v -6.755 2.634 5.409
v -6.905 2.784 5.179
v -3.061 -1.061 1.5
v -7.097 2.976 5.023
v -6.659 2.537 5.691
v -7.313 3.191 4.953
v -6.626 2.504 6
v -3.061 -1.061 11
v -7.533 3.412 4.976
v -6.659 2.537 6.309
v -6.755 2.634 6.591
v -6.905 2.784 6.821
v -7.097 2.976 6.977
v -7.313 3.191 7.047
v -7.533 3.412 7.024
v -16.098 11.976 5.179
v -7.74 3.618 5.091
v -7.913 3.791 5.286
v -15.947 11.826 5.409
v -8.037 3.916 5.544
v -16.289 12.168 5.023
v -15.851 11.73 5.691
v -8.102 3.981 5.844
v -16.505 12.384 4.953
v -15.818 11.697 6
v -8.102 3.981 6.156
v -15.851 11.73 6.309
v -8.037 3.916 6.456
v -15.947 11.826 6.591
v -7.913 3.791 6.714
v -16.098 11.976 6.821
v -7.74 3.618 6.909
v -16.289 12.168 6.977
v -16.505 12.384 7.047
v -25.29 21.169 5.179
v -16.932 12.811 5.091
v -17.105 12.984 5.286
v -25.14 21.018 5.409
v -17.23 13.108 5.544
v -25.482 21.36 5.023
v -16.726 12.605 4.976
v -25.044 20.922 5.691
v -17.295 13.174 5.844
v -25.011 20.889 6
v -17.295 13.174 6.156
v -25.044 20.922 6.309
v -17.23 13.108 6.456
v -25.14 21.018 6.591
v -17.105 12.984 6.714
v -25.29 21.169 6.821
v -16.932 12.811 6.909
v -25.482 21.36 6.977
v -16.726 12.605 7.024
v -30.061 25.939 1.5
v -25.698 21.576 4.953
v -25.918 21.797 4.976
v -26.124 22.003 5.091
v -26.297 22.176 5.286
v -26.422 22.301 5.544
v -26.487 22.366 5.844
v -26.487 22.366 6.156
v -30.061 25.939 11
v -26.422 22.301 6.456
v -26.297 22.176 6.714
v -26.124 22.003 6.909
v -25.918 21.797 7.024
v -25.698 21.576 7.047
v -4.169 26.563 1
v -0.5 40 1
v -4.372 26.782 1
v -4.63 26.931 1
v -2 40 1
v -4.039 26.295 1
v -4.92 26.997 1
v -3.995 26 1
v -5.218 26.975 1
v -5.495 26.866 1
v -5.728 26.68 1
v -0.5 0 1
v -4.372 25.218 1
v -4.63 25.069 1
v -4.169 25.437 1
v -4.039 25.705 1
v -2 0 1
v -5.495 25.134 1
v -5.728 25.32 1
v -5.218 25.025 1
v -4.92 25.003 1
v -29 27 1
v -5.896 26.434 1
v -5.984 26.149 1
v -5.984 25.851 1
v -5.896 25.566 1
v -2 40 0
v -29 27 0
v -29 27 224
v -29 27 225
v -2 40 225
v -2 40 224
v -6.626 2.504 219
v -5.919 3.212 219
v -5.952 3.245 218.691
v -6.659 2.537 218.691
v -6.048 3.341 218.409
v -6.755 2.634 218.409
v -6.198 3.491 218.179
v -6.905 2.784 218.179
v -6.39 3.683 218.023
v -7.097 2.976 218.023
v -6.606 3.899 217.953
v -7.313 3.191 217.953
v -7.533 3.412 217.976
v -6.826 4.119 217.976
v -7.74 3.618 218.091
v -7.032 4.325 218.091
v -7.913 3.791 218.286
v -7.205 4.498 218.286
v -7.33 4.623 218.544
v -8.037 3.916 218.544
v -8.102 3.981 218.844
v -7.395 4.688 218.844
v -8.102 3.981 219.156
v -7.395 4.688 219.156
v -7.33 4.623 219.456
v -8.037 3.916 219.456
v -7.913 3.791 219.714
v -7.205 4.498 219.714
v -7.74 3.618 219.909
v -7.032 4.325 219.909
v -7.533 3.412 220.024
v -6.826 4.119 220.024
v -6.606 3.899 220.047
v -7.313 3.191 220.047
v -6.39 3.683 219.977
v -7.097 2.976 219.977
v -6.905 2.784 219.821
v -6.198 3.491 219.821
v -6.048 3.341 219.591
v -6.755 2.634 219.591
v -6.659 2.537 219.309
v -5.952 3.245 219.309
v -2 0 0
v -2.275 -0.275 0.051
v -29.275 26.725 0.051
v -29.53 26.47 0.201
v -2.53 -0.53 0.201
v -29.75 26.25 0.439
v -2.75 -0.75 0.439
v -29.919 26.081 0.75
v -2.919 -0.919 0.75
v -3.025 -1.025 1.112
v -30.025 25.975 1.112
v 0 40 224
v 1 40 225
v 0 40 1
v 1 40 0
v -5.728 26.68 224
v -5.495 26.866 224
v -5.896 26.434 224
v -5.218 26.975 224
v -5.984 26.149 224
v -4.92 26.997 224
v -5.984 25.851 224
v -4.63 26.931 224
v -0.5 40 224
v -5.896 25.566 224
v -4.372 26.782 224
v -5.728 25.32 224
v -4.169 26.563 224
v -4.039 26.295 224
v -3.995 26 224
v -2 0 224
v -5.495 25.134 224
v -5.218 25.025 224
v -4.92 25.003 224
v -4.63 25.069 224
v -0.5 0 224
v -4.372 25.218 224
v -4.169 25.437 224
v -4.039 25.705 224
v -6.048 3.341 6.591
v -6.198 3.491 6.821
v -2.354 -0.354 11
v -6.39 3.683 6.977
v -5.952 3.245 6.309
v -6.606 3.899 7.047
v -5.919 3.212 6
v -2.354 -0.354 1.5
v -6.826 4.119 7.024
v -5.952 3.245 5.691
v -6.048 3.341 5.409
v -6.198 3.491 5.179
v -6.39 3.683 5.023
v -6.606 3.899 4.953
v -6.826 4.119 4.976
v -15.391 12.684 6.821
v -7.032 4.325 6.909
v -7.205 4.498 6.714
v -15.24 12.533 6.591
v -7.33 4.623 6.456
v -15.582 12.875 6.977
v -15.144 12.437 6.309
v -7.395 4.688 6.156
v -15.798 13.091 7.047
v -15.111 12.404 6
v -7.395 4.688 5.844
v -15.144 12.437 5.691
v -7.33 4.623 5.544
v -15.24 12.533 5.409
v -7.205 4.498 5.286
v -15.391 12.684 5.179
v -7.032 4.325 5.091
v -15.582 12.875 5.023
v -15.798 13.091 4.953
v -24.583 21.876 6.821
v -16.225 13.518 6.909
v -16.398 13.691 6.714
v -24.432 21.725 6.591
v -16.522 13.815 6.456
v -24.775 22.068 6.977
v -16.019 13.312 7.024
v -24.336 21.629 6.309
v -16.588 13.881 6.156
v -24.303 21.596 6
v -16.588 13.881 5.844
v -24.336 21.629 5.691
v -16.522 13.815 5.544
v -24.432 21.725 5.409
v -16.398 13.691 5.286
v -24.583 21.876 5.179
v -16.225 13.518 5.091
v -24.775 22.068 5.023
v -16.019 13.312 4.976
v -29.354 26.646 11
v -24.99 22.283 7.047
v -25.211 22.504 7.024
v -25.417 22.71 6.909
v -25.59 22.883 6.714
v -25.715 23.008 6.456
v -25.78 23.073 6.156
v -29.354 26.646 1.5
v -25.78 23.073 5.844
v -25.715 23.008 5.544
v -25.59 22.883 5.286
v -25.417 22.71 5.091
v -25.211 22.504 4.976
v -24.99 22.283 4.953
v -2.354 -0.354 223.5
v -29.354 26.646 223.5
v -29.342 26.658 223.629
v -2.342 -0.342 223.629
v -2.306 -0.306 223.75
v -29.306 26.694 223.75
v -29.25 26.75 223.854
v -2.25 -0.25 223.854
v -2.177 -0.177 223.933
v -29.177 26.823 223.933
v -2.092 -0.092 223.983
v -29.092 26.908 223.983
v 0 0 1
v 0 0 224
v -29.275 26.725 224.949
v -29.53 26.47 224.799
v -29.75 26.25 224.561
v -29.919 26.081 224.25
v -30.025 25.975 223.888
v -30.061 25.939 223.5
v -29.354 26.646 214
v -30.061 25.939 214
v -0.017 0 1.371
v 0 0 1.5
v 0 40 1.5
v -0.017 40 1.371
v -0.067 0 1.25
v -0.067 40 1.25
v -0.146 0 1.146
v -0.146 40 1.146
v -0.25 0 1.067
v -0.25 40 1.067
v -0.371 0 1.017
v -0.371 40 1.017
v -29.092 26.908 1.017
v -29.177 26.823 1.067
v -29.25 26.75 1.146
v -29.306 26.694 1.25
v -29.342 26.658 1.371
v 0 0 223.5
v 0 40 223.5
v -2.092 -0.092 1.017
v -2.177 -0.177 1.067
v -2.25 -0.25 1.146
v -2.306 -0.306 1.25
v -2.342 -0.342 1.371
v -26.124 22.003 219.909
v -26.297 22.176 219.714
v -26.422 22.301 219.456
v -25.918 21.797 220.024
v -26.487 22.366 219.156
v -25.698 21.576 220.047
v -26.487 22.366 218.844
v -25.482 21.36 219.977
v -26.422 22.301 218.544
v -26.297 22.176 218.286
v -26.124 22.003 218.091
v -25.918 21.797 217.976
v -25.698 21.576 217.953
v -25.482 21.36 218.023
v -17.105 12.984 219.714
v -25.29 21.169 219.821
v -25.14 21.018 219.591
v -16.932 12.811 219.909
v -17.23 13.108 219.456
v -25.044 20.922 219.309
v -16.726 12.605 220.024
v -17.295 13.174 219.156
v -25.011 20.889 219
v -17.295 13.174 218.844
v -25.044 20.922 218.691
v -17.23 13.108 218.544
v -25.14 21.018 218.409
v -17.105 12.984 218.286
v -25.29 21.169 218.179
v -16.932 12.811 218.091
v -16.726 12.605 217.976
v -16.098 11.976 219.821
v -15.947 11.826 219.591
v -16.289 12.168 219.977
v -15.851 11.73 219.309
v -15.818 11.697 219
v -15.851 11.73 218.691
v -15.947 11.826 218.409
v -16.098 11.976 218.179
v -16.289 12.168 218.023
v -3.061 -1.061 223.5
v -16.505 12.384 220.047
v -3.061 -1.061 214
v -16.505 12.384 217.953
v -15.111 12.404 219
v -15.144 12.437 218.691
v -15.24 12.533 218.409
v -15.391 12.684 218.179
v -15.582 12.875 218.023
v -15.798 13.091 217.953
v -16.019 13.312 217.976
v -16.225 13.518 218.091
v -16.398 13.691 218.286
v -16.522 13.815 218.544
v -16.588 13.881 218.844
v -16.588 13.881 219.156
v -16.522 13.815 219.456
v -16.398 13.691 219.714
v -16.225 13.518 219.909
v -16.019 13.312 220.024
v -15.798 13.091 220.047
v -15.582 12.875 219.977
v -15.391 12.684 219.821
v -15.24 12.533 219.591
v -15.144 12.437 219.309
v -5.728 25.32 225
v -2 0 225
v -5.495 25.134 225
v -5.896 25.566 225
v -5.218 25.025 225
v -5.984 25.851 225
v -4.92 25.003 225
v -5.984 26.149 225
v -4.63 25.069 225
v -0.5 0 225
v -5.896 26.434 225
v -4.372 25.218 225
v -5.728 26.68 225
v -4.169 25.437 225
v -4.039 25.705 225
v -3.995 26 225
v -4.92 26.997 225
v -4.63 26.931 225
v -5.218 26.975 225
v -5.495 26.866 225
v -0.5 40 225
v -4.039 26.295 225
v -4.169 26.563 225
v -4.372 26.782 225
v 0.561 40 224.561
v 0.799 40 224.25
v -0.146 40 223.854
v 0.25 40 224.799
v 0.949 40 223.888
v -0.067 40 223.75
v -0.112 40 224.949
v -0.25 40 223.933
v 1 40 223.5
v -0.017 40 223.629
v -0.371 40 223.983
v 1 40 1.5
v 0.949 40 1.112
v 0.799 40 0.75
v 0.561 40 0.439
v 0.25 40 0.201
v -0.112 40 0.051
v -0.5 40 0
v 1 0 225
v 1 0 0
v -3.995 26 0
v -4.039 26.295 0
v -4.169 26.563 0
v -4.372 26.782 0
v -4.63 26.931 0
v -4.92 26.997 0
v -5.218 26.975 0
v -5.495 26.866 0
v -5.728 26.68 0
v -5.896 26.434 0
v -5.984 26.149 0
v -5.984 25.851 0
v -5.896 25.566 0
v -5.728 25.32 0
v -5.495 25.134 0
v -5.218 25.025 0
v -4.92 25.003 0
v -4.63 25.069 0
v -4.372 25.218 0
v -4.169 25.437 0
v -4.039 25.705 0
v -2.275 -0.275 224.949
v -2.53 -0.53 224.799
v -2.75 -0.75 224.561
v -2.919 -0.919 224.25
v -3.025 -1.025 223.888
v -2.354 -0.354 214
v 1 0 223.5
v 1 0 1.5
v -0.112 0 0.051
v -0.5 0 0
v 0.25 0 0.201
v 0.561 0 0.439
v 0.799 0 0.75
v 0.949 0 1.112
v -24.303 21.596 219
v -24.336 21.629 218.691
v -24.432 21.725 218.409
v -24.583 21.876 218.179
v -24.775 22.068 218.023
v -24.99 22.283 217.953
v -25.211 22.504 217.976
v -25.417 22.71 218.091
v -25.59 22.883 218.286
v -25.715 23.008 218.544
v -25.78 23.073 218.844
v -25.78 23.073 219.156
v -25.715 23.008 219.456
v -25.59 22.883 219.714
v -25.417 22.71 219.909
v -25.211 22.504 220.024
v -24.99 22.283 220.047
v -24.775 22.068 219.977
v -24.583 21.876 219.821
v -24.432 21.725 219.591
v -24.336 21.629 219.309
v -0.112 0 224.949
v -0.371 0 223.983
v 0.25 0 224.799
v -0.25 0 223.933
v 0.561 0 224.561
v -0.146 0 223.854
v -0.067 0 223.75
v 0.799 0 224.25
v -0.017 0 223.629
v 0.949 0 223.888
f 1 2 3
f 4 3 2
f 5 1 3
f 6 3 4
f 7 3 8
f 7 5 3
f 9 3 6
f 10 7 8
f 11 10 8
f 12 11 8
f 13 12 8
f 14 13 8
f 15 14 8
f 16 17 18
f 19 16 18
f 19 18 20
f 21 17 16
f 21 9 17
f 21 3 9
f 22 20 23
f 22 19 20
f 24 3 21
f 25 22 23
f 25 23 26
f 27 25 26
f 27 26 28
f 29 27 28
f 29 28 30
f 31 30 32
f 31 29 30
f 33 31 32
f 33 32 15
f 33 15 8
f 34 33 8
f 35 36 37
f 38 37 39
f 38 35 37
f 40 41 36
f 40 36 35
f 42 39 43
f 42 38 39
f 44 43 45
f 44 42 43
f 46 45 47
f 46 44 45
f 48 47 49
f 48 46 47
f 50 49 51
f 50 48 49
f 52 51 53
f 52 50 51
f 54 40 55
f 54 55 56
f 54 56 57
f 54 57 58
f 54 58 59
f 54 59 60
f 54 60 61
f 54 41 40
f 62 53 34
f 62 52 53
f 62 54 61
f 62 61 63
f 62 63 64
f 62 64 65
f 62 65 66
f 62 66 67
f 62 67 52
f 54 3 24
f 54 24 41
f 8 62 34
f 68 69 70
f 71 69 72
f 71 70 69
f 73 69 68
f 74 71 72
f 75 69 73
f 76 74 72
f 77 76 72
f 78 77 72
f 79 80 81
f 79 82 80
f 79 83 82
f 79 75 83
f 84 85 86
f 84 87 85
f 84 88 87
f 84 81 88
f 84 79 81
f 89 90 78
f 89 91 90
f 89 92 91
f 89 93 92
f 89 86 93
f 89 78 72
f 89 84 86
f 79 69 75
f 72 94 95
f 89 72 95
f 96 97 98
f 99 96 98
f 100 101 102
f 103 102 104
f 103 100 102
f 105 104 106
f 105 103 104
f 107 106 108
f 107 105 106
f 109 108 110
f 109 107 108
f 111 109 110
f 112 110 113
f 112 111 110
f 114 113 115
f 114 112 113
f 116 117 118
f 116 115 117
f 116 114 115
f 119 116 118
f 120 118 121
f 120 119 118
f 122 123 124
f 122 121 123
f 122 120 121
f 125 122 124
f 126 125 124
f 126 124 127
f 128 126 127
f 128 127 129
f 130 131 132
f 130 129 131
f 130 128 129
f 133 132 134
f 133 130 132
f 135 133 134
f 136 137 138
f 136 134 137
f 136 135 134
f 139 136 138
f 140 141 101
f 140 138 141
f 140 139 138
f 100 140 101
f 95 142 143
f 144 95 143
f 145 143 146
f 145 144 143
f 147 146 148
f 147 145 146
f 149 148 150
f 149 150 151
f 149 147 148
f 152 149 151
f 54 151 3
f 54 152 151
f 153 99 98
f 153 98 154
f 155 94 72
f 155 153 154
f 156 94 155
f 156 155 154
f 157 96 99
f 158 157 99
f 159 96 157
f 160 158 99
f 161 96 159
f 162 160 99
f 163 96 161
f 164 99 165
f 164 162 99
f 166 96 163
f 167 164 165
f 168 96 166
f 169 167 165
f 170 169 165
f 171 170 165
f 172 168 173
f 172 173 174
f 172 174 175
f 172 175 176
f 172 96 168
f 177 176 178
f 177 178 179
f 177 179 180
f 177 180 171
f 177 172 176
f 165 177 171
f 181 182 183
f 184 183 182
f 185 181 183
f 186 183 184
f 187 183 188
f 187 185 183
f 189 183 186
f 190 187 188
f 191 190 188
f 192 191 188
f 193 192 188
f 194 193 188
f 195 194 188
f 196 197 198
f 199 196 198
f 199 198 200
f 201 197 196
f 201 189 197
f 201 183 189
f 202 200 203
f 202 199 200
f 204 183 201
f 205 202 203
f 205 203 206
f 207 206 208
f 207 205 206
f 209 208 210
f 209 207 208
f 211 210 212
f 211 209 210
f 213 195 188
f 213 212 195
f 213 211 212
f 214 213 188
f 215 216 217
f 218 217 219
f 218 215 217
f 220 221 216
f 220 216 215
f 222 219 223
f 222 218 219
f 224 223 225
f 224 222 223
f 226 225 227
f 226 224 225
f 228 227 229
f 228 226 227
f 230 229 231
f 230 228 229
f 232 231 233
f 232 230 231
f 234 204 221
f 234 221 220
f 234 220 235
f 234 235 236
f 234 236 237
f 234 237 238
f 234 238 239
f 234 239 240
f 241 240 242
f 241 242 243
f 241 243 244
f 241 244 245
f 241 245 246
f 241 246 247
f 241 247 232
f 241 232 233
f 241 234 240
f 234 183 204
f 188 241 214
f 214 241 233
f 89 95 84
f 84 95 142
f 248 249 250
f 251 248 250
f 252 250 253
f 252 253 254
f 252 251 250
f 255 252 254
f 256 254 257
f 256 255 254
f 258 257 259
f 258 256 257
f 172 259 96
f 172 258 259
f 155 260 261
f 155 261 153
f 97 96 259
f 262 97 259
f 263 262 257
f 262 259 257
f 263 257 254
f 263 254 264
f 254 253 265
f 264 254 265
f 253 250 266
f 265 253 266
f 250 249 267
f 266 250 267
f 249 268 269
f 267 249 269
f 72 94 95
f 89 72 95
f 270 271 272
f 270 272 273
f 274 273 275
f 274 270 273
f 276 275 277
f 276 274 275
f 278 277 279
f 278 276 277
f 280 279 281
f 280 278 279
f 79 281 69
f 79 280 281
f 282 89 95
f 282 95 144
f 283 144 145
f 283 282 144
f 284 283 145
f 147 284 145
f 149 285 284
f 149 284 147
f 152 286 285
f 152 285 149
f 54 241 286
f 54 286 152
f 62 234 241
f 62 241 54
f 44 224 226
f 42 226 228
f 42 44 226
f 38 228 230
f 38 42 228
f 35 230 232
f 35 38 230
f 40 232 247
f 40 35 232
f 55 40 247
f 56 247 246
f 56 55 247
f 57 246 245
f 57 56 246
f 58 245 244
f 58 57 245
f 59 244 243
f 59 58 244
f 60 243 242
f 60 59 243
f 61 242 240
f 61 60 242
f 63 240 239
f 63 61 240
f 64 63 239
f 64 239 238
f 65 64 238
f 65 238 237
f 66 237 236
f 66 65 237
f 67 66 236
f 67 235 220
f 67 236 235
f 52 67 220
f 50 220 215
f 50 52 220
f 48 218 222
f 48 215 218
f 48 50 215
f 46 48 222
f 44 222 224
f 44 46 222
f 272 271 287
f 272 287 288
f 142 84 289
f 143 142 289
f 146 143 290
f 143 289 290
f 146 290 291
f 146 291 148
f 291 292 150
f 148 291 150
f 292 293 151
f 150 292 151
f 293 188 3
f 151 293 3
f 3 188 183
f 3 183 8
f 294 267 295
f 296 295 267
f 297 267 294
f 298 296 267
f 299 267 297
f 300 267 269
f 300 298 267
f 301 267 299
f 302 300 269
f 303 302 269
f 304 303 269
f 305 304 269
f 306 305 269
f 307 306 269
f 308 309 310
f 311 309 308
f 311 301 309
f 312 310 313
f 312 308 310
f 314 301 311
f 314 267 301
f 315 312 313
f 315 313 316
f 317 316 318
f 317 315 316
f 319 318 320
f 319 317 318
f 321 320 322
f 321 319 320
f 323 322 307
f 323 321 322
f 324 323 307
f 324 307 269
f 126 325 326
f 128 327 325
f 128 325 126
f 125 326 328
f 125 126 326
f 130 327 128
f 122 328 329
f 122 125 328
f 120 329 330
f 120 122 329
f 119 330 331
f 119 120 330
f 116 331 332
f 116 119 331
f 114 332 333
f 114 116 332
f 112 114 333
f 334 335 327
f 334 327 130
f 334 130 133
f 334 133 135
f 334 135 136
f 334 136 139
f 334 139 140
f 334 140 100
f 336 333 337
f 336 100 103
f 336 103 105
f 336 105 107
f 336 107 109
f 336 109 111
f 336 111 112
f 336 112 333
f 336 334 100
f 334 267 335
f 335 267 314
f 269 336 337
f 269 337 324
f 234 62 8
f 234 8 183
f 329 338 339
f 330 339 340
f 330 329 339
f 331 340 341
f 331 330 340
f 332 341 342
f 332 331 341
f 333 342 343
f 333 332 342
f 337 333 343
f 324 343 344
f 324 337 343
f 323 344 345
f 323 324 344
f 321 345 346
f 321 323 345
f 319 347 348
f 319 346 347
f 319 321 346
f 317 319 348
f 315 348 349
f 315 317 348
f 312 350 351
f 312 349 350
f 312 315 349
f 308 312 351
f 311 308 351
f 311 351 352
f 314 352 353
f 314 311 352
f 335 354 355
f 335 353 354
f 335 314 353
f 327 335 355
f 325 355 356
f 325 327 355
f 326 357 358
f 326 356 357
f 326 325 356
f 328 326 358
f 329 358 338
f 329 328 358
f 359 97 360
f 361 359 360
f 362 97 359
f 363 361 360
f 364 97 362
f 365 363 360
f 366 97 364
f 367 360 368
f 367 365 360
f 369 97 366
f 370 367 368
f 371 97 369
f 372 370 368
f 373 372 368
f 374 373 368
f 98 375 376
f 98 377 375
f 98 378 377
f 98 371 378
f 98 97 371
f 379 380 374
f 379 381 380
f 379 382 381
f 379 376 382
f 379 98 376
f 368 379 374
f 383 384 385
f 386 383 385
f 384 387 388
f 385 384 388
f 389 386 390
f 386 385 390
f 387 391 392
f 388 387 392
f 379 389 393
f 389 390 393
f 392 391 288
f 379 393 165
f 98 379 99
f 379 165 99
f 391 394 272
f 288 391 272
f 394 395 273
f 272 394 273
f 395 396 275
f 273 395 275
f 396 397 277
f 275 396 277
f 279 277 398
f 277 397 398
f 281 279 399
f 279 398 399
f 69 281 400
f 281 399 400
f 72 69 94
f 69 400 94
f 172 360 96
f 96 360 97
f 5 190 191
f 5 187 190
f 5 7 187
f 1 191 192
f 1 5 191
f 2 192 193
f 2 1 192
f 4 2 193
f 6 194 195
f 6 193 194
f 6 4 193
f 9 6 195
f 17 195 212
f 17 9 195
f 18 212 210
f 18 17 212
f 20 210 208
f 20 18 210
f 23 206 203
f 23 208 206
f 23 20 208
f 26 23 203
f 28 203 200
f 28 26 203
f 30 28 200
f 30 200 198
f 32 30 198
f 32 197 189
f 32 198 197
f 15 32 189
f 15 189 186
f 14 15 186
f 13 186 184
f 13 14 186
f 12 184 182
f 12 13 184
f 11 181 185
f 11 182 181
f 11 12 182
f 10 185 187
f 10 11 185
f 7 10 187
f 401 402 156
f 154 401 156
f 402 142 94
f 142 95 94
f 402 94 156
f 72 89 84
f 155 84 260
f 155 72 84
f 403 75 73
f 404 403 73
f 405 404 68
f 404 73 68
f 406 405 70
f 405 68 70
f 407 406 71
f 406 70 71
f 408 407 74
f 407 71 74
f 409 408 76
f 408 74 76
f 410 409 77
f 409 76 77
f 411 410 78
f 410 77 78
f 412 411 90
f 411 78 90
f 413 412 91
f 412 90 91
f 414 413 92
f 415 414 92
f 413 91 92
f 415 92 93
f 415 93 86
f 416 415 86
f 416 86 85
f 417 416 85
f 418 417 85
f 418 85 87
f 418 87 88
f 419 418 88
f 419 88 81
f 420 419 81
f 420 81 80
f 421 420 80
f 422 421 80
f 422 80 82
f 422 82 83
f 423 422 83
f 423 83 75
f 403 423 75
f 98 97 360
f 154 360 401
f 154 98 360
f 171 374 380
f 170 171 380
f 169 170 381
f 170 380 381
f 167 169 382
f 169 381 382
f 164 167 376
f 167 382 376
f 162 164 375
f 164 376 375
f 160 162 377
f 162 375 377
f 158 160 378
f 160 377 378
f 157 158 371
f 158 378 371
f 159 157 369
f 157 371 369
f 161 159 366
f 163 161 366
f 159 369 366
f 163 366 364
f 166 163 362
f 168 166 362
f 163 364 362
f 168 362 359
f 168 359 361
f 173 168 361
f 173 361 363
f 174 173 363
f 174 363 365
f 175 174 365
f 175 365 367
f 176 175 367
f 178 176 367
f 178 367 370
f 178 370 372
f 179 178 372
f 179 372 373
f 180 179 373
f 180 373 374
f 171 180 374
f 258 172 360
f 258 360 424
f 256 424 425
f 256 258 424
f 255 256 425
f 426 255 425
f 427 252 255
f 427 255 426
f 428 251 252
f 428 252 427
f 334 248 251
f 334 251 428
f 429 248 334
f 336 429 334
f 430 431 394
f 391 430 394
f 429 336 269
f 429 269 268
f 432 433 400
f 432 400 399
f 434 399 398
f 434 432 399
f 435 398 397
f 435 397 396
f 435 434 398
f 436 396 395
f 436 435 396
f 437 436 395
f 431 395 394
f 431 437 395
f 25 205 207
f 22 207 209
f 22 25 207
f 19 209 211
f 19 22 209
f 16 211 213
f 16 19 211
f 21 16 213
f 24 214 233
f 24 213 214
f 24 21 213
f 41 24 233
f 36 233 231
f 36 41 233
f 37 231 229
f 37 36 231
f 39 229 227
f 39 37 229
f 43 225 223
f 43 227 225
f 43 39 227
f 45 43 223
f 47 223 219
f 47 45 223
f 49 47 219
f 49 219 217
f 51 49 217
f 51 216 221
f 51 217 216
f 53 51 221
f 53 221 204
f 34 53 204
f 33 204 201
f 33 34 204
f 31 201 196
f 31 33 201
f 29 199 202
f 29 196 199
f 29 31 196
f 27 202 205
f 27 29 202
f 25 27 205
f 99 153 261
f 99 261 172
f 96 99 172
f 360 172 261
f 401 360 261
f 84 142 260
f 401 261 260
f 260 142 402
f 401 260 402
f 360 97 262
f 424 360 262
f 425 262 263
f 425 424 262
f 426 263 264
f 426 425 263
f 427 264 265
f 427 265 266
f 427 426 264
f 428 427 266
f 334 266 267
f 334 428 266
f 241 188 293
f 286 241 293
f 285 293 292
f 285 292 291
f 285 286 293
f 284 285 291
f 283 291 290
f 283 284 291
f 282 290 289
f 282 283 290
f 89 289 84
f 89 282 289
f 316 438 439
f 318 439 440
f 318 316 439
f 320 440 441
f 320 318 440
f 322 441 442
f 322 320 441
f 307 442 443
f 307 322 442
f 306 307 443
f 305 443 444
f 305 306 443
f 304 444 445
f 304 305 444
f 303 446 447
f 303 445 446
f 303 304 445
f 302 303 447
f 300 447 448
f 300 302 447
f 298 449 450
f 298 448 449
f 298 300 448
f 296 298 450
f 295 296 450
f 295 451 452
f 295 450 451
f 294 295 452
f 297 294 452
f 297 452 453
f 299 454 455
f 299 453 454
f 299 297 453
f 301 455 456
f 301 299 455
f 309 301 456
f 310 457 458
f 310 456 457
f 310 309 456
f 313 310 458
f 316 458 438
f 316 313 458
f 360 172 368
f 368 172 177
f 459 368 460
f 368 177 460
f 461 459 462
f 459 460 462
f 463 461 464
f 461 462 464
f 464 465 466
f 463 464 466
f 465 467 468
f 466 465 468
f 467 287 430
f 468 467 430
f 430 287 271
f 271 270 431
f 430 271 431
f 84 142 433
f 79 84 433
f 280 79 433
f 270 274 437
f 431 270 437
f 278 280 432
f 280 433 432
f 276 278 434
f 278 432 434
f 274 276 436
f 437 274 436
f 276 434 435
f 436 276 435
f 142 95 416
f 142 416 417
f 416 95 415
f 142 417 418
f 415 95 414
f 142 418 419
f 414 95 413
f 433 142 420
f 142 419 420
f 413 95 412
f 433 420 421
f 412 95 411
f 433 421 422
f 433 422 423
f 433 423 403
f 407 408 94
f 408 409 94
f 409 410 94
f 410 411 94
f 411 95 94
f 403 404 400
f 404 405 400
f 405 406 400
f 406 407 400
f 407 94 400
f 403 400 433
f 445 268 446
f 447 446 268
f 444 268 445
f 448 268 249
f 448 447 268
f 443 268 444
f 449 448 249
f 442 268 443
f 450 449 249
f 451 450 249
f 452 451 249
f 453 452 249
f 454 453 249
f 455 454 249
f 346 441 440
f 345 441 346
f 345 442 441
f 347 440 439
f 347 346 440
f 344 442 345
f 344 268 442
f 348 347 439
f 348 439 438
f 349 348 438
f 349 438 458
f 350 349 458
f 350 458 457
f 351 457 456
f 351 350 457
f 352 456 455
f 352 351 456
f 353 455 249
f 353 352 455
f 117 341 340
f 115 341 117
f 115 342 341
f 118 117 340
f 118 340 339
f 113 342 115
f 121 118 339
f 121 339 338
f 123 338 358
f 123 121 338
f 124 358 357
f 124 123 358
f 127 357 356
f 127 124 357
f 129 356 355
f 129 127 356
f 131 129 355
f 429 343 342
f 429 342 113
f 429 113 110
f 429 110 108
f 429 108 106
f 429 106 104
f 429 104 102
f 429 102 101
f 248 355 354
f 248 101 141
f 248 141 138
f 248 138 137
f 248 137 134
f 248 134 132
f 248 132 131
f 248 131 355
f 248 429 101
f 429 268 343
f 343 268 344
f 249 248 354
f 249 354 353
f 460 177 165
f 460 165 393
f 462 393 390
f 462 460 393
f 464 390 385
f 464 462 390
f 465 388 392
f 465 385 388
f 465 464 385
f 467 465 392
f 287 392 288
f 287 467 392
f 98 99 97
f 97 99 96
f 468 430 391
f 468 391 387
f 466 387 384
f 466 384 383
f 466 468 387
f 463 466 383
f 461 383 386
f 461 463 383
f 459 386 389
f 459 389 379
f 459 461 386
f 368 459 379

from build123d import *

# Parameters (mm, degrees)
SKETCH_1_W                       = 1
SKETCH_1_H                       = 40
EXTRUDE_1_DEPTH                  = 225
EXTRUDE_2_DEPTH                  = 1
EXTRUDE_3_DEPTH                  = 1
SHEET_METAL_1_OUTLINE_W          = 1
SHEET_METAL_1_OUTLINE_H          = 40
SHEET_METAL_1_DEPTH              = 225
SHEET_METAL_1_2_DEPTH            = 1.5
SHEET_START                      = 223.5
SHEET_METAL_1_3_DEPTH            = 1.5
SHEET_START_2                    = -1
SHEET_METAL_1_4_DEPTH            = 42
SM_EDGE_FLANGE_1_DEPTH           = 38.183766184
SM_EDGE_FLANGE_2_DEPTH           = 38.183766184
SKETCH_15_R                      = 1
CUT_EXTRUDE_1_DEPTH              = 231.496514702
HOLE_WIZARD_2_1_2_1_1_AT_2_COUNT = 2
HOLE_WIZARD_2_1_2_1_1_AT_2_PITCH = 13
HOLE_WIZARD_2_1_2_1_1_AT_3_COUNT = 2
HOLE_WIZARD_2_1_2_1_1_AT_3_PITCH = 26
HOLE_WIZARD_2_1_2_1_1_AT_4_COUNT = 2
HOLE_WIZARD_2_1_2_1_1_AT_4_PITCH = 213
HOLE_WIZARD_2_1_2_1_1_AT_5_COUNT = 2
HOLE_WIZARD_2_1_2_1_1_AT_5_PITCH = 213.396344861
HOLE_WIZARD_2_1_2_1_1_AT_6_COUNT = 2
HOLE_WIZARD_2_1_2_1_1_AT_6_PITCH = 214.580987042


with BuildPart() as part:
    # Sketch 1 → Бобышка-Вытянуть1 (new body)
    with BuildSketch(Plane.XY):
        with Locations((0.5, 20)):
            Rectangle(SKETCH_1_W, SKETCH_1_H)
    extrude(amount=EXTRUDE_1_DEPTH)

    # Эскиз2 → Бобышка-Вытянуть2 (add)
    with BuildSketch(Plane.XY.offset(225)):
        Polygon((1, 0), (-2, 0), (-29, 27), (-2, 40), (1, 40), align=None)
    extrude(amount=-EXTRUDE_2_DEPTH)

    # Эскиз4 → Бобышка-Вытянуть3 (add)
    with BuildSketch(Plane(origin=(0, 0, 0), x_dir=(-1, 0, 0), z_dir=(0, 0, -1))):
        Polygon((-1, 40), (2, 40), (29, 27), (2, 0), (-1, 0), align=None)
    extrude(amount=-EXTRUDE_3_DEPTH)


with BuildPart() as body_2:
    # Sheet Metal 1: read off the stored shape, not the designer's step
    # Sheet Metal 1 outline → Sheet Metal 1 (new body)
    with BuildSketch(Plane.XY):
        with Locations((0.5, 20)):
            Rectangle(SHEET_METAL_1_OUTLINE_W, SHEET_METAL_1_OUTLINE_H)
    extrude(amount=SHEET_METAL_1_DEPTH)

    # Sheet Metal 1 2 outline → Sheet Metal 1 2 (add)
    with BuildSketch(Plane.XY):
        Polygon((0, 0), (0, 40), (-2, 40), (-29, 27), (-2, 0), align=None)
    extrude(amount=SHEET_METAL_1_2_DEPTH)

    # Sheet Metal 1 3 outline → Sheet Metal 1 3 (add)
    with BuildSketch(Plane.XY.offset(SHEET_START)):
        Polygon((0, 0), (0, 40), (-2, 40), (-29, 27), (-2, 0), align=None)
    extrude(amount=SHEET_METAL_1_3_DEPTH)

    # Sheet Metal 1 4 outline → Sheet Metal 1 4 (cut)
    with BuildSketch(Plane(origin=(0, 0, 0), x_dir=(1, 0, 0), z_dir=(0, 1, 0)).offset(SHEET_START_2)):
        with BuildLine():
            Line((-31, -224), (-0.5, -224))
            ThreePointArc((-0.5, -224), (-0.146446609, -223.853553391), (0, -223.5))
            Line((0, -223.5), (-31, -223.5))
            Line((-31, -223.5), (-31, -224))
        make_face()
        with BuildLine():
            Line((-0.5, -225), (-31, -224.999999985))
            Line((-31, -224.999999985), (-31, -226))
            Line((-31, -226), (0.999999887, -226))
            Line((0.999999887, -226), (1, -223.5))
            ThreePointArc((1, -223.5), (0.560660172, -224.560660172), (-0.5, -225))
        make_face()
        with BuildLine():
            Line((-31, -1), (-31, -1.5))
            Line((-31, -1.5), (0, -1.5))
            ThreePointArc((0, -1.5), (-0.146446609, -1.146446609), (-0.5, -1))
            Line((-0.5, -1), (-31, -1))
        make_face()
        with BuildLine():
            Line((-31, 1), (-31, -1.5e-08))
            Line((-31, -1.5e-08), (-0.5, 0))
            ThreePointArc((-0.5, 0), (0.560660172, -0.439339828), (1, -1.5))
            Line((1, -1.5), (0.999999887, 1))
            Line((0.999999887, 1), (-31, 1))
        make_face()
    extrude(amount=SHEET_METAL_1_4_DEPTH, mode=Mode.SUBTRACT)

    # Ребро-кромка1: sheet metal written as solids
    # Ребро-кромка1 section (on a plane across the edge) → Ребро-кромка1 (add)
    with BuildSketch(Plane(origin=(-2.353553391, -0.353553391, 224), x_dir=(0.7071067811865476, 0.7071067811865475, -3.4914813388431334e-15), z_dir=(-0.7071067811865475, 0.7071067811865476, 0))):
        with BuildLine():
            Line((-1, 0.5), (-1, 10))
            Line((-1, 10), (0, 10))
            Line((0, 10), (0, 0.5))
            ThreePointArc((0, 0.5), (0.146446609, 0.146446609), (0.5, 0))
            Line((0.5, 0), (0.5, -1))
            ThreePointArc((0.5, -1), (-0.560660172, -0.560660172), (-1, 0.5))
        make_face()
    extrude(amount=SM_EDGE_FLANGE_1_DEPTH)

    # Ребро-кромка2: sheet metal written as solids
    # Ребро-кромка2 section (on a plane across the edge) → Ребро-кромка2 (add)
    with BuildSketch(Plane(origin=(-29.353553391, 26.646446609, 1), x_dir=(0.7071067811865476, 0.7071067811865475, 3.4914813388431334e-15), z_dir=(0.7071067811865475, -0.7071067811865476, 0))):
        with BuildLine():
            Line((-1, 0.5), (-1, 10))
            Line((-1, 10), (0, 10))
            Line((0, 10), (0, 0.5))
            ThreePointArc((0, 0.5), (0.146446609, 0.146446609), (0.5, 0))
            Line((0.5, 0), (0.5, -1))
            ThreePointArc((0.5, -1), (-0.560660172, -0.560660172), (-1, 0.5))
        make_face()
    extrude(amount=SM_EDGE_FLANGE_2_DEPTH)

    # Эскиз15 → Вырез-Вытянуть1 (cut, through all)
    with BuildSketch(Plane.XY.offset(225)):
        with Locations((-4.995026007, 26)):
            Circle(SKETCH_15_R)
    extrude(amount=-CUT_EXTRUDE_1_DEPTH, mode=Mode.SUBTRACT)

    # Эскиз16 → Диаметр отверстия Ø2.1 (2.1)1 (revolve, cut)
    with BuildSketch(Plane(origin=(-25.753048327, 21.631727984, 219), x_dir=(0.7071067811865475, -0.7071067811865477, 0), z_dir=(0, 0, 1))):
        Polygon((0, 0), (0, 5.63090365), (1.05, 5), (1.05, 0), align=None)
    hole_wizard_2_1_2_1_1 = revolve(axis=Axis((-30.243176388, 17.141599923, 219), (0.7071067811865476, 0.7071067811865474, -3.4812242521929712e-15)), mode=Mode.SUBTRACT)

    # Диаметр отверстия Ø2.1 (2.1)1 at 2: Диаметр отверстия Ø2.1 (2.1)1 ×2
    with Locations(*[Vector(0.7071067811865476, -0.7071067811865476, 3.886729494756105e-15) * (i * HOLE_WIZARD_2_1_2_1_1_AT_2_PITCH) for i in range(1, HOLE_WIZARD_2_1_2_1_1_AT_2_COUNT)]):
        add(hole_wizard_2_1_2_1_1, mode=Mode.SUBTRACT)

    # Диаметр отверстия Ø2.1 (2.1)1 at 3: Диаметр отверстия Ø2.1 (2.1)1 ×2
    with Locations(*[Vector(0.7071067811865476, -0.7071067811865476, 3.0365074177782066e-15) * (i * HOLE_WIZARD_2_1_2_1_1_AT_3_PITCH) for i in range(1, HOLE_WIZARD_2_1_2_1_1_AT_3_COUNT)]):
        add(hole_wizard_2_1_2_1_1, mode=Mode.SUBTRACT)

    # Диаметр отверстия Ø2.1 (2.1)1 at 4: Диаметр отверстия Ø2.1 (2.1)1 ×2
    with Locations(*[(0, 0, -i * HOLE_WIZARD_2_1_2_1_1_AT_4_PITCH) for i in range(1, HOLE_WIZARD_2_1_2_1_1_AT_4_COUNT)]):
        add(hole_wizard_2_1_2_1_1, mode=Mode.SUBTRACT)

    # Диаметр отверстия Ø2.1 (2.1)1 at 5: Диаметр отверстия Ø2.1 (2.1)1 ×2
    with Locations(*[Vector(0.04307659609360352, -0.04307659609360844, -0.9981426820540121) * (i * HOLE_WIZARD_2_1_2_1_1_AT_5_PITCH) for i in range(1, HOLE_WIZARD_2_1_2_1_1_AT_5_COUNT)]):
        add(hole_wizard_2_1_2_1_1, mode=Mode.SUBTRACT)

    # Диаметр отверстия Ø2.1 (2.1)1 at 6: Диаметр отверстия Ø2.1 (2.1)1 ×2
    with Locations(*[Vector(0.085677564281292, -0.0856775642812969, -0.9926322128349702) * (i * HOLE_WIZARD_2_1_2_1_1_AT_6_PITCH) for i in range(1, HOLE_WIZARD_2_1_2_1_1_AT_6_COUNT)]):
        add(hole_wizard_2_1_2_1_1, mode=Mode.SUBTRACT)


solid = Compound([part.part, body_2.part])
